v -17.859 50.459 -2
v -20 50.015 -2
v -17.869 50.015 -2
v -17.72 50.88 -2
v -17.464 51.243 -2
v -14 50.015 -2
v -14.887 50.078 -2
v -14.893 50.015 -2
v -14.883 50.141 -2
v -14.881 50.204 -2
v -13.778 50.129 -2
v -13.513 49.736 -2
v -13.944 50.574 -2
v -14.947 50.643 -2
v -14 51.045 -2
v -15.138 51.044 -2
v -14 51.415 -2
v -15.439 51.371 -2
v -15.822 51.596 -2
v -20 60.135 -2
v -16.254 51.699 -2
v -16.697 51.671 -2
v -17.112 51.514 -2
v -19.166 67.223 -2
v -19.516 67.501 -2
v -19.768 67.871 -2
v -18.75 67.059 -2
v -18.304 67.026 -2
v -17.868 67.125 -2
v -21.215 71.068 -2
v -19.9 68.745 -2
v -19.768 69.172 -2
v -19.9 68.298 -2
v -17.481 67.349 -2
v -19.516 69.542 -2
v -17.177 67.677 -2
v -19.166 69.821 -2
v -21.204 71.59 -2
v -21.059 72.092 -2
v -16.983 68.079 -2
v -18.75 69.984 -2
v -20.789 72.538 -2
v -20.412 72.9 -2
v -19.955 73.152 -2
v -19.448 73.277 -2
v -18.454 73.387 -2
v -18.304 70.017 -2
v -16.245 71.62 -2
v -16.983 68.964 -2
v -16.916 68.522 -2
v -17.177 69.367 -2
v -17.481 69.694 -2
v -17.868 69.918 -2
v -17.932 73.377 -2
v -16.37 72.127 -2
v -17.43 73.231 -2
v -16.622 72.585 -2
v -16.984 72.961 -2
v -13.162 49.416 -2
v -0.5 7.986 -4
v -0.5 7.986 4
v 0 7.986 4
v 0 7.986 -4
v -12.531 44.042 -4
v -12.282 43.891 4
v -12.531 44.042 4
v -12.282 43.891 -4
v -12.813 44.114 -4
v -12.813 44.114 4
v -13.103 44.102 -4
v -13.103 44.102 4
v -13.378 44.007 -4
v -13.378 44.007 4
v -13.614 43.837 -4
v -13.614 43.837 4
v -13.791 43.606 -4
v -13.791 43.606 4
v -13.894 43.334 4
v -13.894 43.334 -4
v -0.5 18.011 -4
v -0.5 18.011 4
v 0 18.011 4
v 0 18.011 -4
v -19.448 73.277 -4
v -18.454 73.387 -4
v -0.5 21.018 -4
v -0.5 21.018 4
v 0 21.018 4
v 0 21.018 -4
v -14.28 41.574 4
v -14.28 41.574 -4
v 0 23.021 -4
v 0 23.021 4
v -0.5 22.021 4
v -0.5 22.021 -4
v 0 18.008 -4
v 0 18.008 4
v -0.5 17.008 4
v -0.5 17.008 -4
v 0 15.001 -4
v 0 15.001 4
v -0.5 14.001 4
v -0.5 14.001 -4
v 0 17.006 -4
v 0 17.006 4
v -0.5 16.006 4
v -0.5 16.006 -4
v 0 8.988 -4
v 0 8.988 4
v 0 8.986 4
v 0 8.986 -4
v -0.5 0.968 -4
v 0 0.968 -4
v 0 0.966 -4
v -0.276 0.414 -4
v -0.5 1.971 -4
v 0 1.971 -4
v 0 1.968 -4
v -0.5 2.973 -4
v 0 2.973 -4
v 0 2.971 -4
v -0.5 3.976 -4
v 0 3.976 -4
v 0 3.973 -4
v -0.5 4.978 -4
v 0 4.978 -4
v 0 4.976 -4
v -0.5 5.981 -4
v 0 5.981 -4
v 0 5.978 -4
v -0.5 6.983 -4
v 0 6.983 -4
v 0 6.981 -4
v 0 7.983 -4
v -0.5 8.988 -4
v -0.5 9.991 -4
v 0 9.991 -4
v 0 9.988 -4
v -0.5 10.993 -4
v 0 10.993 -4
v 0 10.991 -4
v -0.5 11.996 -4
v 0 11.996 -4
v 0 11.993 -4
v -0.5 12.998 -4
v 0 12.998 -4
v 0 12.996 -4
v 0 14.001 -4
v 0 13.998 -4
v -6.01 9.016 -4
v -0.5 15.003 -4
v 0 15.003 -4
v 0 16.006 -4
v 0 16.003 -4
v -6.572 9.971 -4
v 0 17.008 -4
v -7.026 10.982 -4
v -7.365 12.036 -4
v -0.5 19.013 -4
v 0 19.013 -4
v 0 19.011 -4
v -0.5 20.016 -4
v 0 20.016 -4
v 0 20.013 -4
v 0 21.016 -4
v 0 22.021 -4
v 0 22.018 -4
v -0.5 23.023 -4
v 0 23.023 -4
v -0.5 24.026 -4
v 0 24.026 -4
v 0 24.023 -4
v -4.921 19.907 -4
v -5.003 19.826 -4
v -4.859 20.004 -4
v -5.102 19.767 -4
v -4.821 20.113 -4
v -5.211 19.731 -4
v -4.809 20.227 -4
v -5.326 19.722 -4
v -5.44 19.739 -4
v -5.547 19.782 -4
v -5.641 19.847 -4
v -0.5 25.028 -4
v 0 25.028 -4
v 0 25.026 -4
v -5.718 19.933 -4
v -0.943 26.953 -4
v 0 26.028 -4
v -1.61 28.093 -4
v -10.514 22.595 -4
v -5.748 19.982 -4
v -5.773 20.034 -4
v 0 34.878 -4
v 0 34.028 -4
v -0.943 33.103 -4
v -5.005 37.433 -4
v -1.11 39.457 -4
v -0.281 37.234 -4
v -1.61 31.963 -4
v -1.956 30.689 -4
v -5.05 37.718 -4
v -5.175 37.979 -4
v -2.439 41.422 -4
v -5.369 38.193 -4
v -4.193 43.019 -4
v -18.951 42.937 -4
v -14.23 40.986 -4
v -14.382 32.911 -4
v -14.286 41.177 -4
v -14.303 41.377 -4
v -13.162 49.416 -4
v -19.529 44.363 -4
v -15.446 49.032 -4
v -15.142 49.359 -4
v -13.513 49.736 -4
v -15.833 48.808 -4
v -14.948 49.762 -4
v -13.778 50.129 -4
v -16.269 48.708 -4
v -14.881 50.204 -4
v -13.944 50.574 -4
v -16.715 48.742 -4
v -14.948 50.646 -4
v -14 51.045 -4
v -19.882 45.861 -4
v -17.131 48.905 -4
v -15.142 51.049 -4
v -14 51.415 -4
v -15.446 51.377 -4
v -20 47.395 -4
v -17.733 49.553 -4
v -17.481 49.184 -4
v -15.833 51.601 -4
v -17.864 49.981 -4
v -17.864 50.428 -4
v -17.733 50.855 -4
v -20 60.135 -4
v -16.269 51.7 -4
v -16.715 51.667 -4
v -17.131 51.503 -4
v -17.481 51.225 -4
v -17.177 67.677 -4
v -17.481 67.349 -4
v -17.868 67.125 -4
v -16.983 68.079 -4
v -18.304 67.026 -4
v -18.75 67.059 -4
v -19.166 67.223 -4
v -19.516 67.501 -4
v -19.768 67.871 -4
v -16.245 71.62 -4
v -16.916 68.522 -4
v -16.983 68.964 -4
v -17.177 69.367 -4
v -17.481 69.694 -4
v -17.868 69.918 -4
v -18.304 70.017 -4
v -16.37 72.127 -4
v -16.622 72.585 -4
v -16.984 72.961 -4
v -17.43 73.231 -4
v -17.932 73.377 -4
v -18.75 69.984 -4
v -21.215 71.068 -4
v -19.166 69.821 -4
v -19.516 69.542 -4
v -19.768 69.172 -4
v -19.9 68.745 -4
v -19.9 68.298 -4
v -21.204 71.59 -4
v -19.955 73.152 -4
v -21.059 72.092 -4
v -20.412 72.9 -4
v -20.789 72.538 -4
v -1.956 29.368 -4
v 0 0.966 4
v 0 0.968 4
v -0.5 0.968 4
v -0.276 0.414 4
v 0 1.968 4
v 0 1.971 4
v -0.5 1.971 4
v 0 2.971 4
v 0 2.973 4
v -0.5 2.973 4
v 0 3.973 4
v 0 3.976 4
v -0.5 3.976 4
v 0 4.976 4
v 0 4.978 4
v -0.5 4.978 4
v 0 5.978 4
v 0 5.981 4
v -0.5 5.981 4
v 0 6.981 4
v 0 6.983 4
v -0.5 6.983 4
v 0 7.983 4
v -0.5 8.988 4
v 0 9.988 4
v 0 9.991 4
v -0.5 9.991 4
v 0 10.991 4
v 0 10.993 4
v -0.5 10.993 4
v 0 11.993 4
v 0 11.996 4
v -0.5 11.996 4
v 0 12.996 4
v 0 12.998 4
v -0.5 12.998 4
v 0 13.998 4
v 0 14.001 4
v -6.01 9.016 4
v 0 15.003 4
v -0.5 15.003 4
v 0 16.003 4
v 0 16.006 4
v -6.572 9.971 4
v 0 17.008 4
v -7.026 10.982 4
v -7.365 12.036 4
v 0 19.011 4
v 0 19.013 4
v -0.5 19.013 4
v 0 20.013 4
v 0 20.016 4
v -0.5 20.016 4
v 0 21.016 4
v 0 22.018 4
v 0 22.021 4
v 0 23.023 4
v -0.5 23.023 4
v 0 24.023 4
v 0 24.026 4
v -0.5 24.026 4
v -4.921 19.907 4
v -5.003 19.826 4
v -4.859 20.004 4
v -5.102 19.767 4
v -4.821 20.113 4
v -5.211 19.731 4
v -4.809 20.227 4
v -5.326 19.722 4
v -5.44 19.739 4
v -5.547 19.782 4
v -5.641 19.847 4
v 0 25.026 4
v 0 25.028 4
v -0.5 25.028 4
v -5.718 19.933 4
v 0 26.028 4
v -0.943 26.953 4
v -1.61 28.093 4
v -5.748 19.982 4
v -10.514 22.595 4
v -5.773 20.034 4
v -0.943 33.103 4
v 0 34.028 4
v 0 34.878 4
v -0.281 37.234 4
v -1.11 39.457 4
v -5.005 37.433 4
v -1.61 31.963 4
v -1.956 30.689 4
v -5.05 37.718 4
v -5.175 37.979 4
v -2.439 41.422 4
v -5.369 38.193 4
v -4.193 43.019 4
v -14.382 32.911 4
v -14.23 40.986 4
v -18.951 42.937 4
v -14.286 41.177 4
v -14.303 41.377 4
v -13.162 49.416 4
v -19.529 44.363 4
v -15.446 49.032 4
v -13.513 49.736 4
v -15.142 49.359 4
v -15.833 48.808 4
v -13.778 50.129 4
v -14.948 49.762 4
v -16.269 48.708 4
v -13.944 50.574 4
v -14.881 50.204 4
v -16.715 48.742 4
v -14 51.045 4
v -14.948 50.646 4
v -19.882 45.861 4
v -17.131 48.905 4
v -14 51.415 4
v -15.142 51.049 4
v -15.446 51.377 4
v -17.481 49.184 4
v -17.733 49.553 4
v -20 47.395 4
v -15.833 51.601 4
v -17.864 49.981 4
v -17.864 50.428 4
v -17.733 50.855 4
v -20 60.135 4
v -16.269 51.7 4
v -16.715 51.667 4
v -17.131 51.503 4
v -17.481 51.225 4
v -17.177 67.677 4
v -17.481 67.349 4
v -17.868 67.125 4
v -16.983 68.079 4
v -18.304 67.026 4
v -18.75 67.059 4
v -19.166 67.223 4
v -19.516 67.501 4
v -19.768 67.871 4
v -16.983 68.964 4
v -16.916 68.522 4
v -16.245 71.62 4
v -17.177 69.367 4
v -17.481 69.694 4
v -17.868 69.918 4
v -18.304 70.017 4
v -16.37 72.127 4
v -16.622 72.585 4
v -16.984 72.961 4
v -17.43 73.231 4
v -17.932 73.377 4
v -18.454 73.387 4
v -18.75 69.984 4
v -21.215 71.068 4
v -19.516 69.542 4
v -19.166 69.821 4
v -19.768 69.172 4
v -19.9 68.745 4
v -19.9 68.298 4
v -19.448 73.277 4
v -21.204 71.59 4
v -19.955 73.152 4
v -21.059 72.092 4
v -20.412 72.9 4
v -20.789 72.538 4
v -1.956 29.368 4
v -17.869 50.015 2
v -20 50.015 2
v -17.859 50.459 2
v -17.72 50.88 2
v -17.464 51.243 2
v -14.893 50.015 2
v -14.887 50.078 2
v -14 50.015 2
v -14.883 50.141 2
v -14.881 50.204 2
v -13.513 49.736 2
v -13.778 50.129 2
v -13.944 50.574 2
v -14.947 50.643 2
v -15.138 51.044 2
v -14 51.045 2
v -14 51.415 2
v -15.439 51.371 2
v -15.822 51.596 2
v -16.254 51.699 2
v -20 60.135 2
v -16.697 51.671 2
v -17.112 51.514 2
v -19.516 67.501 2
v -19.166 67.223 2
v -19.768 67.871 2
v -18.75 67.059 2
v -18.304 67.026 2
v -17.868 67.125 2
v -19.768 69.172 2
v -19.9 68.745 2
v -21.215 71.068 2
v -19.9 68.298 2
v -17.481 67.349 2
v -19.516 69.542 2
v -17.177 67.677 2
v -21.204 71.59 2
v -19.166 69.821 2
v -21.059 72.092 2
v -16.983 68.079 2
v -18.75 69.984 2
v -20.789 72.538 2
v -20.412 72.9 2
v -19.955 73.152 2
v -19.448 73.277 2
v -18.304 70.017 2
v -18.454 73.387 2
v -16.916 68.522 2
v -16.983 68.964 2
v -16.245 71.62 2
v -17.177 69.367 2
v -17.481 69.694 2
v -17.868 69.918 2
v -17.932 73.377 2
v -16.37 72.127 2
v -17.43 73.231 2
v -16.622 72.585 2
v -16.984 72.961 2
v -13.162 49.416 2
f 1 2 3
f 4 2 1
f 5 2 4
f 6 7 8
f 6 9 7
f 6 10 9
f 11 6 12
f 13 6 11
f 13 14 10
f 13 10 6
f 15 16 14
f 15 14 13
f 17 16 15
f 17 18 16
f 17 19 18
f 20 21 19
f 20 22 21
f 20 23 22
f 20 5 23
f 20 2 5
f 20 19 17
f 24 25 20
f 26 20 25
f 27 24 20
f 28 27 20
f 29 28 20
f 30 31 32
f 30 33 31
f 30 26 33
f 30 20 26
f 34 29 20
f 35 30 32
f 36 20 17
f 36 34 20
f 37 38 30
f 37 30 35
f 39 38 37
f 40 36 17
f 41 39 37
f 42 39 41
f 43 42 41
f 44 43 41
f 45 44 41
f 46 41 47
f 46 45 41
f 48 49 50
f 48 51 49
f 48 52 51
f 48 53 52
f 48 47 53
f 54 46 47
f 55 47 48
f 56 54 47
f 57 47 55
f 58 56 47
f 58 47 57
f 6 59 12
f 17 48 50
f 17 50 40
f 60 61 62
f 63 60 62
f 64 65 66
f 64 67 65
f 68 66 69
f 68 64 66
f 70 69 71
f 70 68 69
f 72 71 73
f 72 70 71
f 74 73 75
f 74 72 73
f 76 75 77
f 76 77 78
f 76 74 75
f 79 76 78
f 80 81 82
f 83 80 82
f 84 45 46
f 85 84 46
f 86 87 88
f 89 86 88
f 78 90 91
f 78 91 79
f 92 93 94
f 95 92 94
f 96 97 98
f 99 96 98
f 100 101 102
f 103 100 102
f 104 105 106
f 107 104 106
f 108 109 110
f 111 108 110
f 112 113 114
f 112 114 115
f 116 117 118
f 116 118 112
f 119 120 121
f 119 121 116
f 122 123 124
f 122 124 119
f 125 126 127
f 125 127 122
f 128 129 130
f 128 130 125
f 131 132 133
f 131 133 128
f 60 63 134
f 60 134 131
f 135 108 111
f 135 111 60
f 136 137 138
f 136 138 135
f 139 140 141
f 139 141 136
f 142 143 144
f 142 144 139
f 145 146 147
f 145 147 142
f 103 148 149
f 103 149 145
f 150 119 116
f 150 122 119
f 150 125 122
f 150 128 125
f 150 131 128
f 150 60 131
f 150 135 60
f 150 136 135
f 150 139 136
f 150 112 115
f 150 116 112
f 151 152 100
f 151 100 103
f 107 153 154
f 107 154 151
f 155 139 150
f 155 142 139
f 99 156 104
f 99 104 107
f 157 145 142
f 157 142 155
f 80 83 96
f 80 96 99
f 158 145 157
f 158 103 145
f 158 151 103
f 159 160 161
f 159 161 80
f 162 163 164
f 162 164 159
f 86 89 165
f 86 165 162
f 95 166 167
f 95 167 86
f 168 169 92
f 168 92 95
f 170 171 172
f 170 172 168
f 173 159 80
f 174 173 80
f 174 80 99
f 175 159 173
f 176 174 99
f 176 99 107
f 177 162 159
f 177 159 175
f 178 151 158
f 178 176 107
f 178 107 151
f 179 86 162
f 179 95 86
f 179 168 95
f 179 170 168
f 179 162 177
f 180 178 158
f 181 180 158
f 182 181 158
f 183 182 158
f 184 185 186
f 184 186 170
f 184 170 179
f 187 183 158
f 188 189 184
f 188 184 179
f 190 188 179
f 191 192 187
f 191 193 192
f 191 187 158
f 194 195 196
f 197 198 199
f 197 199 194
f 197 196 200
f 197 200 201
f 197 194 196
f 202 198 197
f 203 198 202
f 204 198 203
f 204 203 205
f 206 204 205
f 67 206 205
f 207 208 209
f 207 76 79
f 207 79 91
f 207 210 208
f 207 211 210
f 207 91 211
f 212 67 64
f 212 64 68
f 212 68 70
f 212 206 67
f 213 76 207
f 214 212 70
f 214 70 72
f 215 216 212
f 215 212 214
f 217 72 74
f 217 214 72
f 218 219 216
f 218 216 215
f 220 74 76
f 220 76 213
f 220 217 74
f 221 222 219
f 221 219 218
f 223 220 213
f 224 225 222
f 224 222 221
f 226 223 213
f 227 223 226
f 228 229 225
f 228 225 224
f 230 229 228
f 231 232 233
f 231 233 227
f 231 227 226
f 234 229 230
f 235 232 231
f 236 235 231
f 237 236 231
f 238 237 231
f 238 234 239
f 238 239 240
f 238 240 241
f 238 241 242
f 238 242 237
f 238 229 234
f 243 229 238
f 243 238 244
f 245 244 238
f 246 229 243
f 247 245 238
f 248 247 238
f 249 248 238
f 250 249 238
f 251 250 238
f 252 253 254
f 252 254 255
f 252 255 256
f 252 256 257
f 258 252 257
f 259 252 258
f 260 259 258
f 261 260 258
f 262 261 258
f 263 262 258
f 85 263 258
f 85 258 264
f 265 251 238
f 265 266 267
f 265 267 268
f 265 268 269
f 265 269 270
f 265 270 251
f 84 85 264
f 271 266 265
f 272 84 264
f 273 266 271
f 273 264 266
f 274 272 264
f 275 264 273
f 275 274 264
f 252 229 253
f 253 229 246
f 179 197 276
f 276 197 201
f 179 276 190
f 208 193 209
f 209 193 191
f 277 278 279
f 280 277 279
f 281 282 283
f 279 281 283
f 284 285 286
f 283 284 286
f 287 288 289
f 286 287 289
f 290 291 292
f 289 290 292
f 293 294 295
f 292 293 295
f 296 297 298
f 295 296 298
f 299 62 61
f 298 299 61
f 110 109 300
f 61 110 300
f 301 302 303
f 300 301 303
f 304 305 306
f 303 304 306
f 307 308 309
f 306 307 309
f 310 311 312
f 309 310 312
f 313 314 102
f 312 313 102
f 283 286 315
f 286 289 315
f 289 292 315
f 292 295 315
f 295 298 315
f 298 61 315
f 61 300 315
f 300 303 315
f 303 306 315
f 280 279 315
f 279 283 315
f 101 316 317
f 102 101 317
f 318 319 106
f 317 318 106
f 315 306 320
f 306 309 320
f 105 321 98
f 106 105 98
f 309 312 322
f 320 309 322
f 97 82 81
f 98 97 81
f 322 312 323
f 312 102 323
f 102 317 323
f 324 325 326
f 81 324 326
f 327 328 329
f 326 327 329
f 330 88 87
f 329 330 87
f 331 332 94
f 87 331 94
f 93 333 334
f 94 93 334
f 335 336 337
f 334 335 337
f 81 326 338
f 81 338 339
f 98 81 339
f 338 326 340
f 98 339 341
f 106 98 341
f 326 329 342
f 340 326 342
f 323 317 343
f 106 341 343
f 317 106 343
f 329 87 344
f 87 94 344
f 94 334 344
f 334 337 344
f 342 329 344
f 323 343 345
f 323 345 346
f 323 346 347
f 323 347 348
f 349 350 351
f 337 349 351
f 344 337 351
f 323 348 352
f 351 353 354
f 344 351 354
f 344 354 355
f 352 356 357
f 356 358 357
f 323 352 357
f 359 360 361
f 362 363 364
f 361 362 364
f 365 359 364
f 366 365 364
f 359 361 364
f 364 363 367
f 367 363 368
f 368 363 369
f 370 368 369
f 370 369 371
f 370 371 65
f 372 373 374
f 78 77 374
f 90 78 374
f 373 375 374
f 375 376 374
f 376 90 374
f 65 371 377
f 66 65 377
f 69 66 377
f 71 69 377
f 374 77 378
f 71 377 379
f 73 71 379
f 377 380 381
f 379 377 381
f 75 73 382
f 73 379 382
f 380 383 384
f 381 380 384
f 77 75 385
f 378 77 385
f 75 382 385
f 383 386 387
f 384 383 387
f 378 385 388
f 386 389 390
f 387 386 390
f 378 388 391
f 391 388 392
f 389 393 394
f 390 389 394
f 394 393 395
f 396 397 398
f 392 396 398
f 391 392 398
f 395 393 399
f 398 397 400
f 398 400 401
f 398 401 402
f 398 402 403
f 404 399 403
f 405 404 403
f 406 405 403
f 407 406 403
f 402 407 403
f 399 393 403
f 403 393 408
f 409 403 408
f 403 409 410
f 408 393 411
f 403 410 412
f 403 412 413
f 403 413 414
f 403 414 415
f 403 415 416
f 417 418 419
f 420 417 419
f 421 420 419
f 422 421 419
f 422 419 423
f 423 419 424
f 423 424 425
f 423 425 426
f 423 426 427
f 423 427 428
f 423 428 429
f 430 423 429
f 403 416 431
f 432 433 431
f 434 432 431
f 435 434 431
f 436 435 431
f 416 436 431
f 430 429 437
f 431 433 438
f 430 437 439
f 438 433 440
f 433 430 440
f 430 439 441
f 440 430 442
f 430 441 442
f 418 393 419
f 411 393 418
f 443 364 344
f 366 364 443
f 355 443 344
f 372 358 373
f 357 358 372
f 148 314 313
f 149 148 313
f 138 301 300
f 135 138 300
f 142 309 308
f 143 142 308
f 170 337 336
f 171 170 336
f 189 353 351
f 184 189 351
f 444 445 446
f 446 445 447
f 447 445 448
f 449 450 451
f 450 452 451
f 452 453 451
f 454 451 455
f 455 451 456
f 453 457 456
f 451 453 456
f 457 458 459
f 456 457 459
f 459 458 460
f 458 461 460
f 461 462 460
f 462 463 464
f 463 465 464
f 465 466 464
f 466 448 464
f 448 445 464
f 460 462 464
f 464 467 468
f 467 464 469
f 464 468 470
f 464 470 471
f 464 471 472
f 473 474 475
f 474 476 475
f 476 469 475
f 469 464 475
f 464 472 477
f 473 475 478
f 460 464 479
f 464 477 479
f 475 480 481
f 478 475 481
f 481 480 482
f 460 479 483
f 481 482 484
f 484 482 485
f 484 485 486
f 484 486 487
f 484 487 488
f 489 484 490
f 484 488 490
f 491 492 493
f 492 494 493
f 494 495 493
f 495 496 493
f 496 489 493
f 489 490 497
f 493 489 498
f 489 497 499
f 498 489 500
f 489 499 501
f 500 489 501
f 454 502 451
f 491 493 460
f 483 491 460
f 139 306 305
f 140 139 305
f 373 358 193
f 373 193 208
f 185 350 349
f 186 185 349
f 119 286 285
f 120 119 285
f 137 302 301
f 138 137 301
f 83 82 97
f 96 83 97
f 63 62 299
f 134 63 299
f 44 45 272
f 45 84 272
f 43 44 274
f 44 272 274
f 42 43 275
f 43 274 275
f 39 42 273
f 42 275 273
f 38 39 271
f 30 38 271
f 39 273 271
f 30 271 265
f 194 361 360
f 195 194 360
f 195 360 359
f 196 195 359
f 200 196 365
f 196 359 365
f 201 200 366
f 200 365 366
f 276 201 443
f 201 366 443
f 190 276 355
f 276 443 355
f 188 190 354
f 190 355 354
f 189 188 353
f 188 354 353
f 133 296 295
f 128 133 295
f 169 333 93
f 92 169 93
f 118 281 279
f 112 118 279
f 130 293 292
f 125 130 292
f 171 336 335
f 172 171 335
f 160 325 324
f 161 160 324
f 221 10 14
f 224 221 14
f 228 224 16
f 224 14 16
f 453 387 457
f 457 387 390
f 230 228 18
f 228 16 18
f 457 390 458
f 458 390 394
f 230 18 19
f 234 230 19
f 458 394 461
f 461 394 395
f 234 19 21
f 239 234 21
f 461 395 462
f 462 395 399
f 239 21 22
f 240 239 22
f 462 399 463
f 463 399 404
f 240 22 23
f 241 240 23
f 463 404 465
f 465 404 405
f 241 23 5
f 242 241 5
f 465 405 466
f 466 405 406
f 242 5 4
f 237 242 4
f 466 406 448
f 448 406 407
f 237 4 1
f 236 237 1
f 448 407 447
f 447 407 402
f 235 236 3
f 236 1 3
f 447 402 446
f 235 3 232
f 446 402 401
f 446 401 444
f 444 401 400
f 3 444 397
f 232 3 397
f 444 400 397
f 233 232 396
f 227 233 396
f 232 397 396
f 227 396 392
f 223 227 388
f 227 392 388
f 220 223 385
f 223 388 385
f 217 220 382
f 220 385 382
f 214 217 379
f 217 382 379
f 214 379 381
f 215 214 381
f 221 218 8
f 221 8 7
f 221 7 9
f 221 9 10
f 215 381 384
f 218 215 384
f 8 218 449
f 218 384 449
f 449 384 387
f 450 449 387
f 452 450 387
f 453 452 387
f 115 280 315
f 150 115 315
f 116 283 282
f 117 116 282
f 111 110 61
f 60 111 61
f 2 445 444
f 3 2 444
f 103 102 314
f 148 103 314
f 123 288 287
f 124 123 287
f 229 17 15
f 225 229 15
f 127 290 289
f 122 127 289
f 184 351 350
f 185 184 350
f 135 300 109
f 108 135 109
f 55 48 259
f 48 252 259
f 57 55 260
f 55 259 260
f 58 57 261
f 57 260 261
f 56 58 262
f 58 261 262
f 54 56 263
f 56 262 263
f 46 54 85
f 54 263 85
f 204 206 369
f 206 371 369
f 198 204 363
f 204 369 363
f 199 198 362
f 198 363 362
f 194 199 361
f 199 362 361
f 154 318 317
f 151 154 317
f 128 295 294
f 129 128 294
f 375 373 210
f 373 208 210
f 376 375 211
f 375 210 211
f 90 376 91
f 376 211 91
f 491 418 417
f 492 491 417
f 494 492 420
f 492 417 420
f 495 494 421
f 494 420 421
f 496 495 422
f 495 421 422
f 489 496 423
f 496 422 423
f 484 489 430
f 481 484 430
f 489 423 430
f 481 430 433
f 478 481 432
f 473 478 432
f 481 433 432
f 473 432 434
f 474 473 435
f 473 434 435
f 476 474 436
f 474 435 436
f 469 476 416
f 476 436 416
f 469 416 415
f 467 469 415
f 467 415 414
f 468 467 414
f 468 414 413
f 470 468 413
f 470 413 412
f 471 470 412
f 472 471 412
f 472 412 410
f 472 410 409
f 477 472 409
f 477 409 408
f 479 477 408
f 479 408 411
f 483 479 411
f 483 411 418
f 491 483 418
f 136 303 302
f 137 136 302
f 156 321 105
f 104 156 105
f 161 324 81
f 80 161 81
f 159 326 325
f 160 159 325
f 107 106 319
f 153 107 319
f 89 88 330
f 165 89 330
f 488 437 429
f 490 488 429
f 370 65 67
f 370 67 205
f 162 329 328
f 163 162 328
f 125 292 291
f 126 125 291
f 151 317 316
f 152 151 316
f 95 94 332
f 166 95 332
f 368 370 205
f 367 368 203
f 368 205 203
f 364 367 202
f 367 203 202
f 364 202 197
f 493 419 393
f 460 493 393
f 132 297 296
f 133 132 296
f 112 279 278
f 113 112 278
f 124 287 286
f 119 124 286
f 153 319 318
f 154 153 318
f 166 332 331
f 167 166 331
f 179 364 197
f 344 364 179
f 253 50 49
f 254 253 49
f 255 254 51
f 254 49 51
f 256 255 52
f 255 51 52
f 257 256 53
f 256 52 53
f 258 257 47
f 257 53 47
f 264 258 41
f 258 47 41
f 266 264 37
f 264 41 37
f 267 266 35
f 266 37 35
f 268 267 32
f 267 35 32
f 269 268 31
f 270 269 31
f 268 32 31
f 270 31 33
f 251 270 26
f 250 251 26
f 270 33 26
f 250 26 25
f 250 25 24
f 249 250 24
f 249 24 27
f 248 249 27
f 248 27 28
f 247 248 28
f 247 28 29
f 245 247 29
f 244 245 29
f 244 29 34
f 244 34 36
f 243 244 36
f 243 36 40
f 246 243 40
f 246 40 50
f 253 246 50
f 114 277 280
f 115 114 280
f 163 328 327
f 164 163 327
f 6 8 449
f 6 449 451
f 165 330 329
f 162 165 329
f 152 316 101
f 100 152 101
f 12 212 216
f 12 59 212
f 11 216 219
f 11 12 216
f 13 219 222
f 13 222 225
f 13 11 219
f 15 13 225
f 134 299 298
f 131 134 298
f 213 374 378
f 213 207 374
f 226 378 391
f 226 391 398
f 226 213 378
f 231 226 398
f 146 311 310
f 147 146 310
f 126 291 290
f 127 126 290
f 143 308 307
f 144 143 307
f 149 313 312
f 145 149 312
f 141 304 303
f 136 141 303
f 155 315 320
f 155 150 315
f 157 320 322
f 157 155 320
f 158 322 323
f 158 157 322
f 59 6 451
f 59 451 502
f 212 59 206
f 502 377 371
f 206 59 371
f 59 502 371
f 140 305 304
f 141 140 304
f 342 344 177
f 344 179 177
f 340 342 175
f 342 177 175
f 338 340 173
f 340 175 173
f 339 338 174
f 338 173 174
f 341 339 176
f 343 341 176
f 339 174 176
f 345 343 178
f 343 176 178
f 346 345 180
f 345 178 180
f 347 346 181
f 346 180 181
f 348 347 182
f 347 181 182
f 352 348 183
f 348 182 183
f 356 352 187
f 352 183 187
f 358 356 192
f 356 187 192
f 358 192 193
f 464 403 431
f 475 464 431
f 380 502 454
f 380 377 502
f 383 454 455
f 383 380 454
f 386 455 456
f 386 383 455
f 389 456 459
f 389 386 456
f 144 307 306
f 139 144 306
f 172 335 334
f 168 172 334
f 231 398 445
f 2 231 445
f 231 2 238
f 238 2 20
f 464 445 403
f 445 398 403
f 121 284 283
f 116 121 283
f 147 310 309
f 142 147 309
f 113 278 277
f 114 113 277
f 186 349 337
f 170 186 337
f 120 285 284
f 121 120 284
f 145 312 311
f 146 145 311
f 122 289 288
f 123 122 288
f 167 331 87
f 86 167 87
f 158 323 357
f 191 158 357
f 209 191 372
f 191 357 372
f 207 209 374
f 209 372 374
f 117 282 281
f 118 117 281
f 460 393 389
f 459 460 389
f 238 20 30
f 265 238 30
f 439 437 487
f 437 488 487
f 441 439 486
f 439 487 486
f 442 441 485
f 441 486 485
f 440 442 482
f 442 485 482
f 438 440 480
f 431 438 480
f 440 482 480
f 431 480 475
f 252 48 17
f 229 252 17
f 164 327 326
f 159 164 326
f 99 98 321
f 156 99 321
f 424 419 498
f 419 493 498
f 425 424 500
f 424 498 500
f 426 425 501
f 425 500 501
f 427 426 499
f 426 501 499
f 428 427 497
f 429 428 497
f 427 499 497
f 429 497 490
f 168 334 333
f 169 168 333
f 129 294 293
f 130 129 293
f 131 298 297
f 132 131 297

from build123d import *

# Parameters (mm, degrees)
BOSS_EXTRUDE1_DEPTH     = 4
SKETCH2_W               = 20
SKETCH2_H               = 25
CUT_EXTRUDE1_DEPTH      = 2
CUT_EXTRUDE2_DEPTH      = 1
CUT_EXTRUDE2_DEPTH_BACK = 9
CUT_EXTRUDE3_DEPTH      = 9
LPATTERN2_COUNT         = 26
LPATTERN2_PITCH         = 1.0025
CUT_EXTRUDE4_DEPTH      = 9
CUT_EXTRUDE5_DEPTH      = 9
FILLET1_R               = 10
FILLET2_R               = 2
FILLET3_R               = 1
FILLET4_R               = 0.5
SKETCH7_R               = 1.5
CUT_EXTRUDE6_DEPTH      = 9.0000001


with BuildPart() as part:
    # Sketch1 → Boss-Extrude1 (new body, symmetric)
    with BuildSketch(Plane.XY):
        Polygon((0, 0), (-20, 30.005392849), (-20, 60.135392849), (-21.435566599, 73.055886204), (-16.466146078, 73.608027203), (-14.000284373, 51.414595156), (-14.000284373, 50.014595156), (0, 40.028289364), align=None)
    extrude(amount=BOSS_EXTRUDE1_DEPTH, both=True)

    # Sketch2 → Cut-Extrude1 (cut, symmetric)
    with BuildSketch(Plane.XY):
        with Locations((-24.000284373, 62.514595156)):
            Rectangle(SKETCH2_W, SKETCH2_H)
    extrude(amount=CUT_EXTRUDE1_DEPTH, both=True, mode=Mode.SUBTRACT)

    # Sketch3 → Cut-Extrude2 (cut, two sides)
    with BuildSketch(Plane.XY.offset(4)) as cut_extrude2_sk:
        with BuildLine():
            Line((91.496624596, 102.650757811), (0, 34.028289364))
            ThreePointArc((0, 34.028289364), (-2, 30.028289364), (0, 26.028289364))
            Line((0, 26.028289364), (91.496624596, -42.594179083))
            Line((91.496624596, -42.594179083), (320.238186086, -42.594179083))
            Line((320.238186086, -42.594179083), (320.238186086, 102.650757811))
            Line((320.238186086, 102.650757811), (91.496624596, 102.650757811))
        make_face()
    extrude(amount=CUT_EXTRUDE2_DEPTH, mode=Mode.SUBTRACT)
    extrude(cut_extrude2_sk.sketch, amount=-CUT_EXTRUDE2_DEPTH_BACK, mode=Mode.SUBTRACT)

    # Sketch4 → Cut-Extrude3 (cut, through all)
    with BuildSketch(Plane.XY.offset(4)):
        Polygon((0, 26.028289364), (-0.5, 25.028289364), (0, 25.028289364), align=None)
    cut_extrude3 = extrude(amount=-CUT_EXTRUDE3_DEPTH, mode=Mode.SUBTRACT)

    # LPattern2: Cut-Extrude3 ×26
    with Locations(*[(0, -i * LPATTERN2_PITCH, 0) for i in range(1, LPATTERN2_COUNT)]):
        add(cut_extrude3, mode=Mode.SUBTRACT)

    # Sketch5 → Cut-Extrude4 (cut, through all)
    with BuildSketch(Plane.XY.offset(4)):
        with BuildLine():
            Line((-20, 30.005392849), (-6.955074875, 10.434487696))
            ThreePointArc((-6.955074875, 10.434487696), (-12.476218242, 28.097776313), (-20, 45.005392849))
            Line((-20, 45.005392849), (-20, 30.005392849))
        make_face()
    extrude(amount=-CUT_EXTRUDE4_DEPTH, mode=Mode.SUBTRACT)

    # Sketch6 → Cut-Extrude5 (cut, through all)
    with BuildSketch(Plane.XY.offset(4)):
        with BuildLine():
            Line((-13.544369657, 44.932398873), (-5.010201765, 37.897373757))
            Line((-5.010201765, 37.897373757), (-4.779170601, 17.572398873))
            add(Edge.make_bspline(
                [(-4.779170601, 17.572398873), (-14.345858132, 41.272398873)],
                knots=[0, 0, 1, 1], degree=1))
            Line((-14.345858132, 41.272398873), (-13.544369657, 44.932398873))
        make_face()
    extrude(amount=-CUT_EXTRUDE5_DEPTH, mode=Mode.SUBTRACT)

    # Fillet1
    fillet1_edges = [part.edges().sort_by_distance(p)[0] for p in [
        (0, 40.028289364, 0),
        (-20, 45.005392849, 0),
        (-6.955074875, 10.434487696, 0),
    ]]
    fillet(fillet1_edges, radius=FILLET1_R)

    # Fillet2
    fillet2_edges = [part.edges().sort_by_distance(p)[0] for p in [
        (-21.435566599, 73.055886204, 3),
        (-16.466146078, 73.608027203, 3),
        (-14.000284373, 50.014595156, 3),
        (-21.435566599, 73.055886204, -3),
        (-16.466146078, 73.608027203, -3),
        (-14.000284373, 50.014595156, -3),
    ]]
    fillet(fillet2_edges, radius=FILLET2_R)

    # Fillet3
    fillet3_edges = [part.edges().sort_by_distance(p)[0] for p in [
        (-14.345858132, 41.272398873, 0),
        (-5.010201765, 37.897373757, 0),
        (-13.544369657, 44.932398873, 0),
    ]]
    fillet(fillet3_edges, radius=FILLET3_R)

    # Fillet4
    fillet4_edges = [part.edges().sort_by_distance(p)[0] for p in [
        (-4.779170601, 17.572398873, 0),
    ]]
    fillet(fillet4_edges, radius=FILLET4_R)

    # Sketch7 → Cut-Extrude6 (cut, through all)
    with BuildSketch(Plane.XY.offset(4)):
        with Locations((-18.416383851, 68.521557639)):
            Circle(SKETCH7_R)
        with Locations((-16.381192126, 50.204273598)):
            Circle(SKETCH7_R)
    extrude(amount=-CUT_EXTRUDE6_DEPTH, mode=Mode.SUBTRACT)


solid = part.part
